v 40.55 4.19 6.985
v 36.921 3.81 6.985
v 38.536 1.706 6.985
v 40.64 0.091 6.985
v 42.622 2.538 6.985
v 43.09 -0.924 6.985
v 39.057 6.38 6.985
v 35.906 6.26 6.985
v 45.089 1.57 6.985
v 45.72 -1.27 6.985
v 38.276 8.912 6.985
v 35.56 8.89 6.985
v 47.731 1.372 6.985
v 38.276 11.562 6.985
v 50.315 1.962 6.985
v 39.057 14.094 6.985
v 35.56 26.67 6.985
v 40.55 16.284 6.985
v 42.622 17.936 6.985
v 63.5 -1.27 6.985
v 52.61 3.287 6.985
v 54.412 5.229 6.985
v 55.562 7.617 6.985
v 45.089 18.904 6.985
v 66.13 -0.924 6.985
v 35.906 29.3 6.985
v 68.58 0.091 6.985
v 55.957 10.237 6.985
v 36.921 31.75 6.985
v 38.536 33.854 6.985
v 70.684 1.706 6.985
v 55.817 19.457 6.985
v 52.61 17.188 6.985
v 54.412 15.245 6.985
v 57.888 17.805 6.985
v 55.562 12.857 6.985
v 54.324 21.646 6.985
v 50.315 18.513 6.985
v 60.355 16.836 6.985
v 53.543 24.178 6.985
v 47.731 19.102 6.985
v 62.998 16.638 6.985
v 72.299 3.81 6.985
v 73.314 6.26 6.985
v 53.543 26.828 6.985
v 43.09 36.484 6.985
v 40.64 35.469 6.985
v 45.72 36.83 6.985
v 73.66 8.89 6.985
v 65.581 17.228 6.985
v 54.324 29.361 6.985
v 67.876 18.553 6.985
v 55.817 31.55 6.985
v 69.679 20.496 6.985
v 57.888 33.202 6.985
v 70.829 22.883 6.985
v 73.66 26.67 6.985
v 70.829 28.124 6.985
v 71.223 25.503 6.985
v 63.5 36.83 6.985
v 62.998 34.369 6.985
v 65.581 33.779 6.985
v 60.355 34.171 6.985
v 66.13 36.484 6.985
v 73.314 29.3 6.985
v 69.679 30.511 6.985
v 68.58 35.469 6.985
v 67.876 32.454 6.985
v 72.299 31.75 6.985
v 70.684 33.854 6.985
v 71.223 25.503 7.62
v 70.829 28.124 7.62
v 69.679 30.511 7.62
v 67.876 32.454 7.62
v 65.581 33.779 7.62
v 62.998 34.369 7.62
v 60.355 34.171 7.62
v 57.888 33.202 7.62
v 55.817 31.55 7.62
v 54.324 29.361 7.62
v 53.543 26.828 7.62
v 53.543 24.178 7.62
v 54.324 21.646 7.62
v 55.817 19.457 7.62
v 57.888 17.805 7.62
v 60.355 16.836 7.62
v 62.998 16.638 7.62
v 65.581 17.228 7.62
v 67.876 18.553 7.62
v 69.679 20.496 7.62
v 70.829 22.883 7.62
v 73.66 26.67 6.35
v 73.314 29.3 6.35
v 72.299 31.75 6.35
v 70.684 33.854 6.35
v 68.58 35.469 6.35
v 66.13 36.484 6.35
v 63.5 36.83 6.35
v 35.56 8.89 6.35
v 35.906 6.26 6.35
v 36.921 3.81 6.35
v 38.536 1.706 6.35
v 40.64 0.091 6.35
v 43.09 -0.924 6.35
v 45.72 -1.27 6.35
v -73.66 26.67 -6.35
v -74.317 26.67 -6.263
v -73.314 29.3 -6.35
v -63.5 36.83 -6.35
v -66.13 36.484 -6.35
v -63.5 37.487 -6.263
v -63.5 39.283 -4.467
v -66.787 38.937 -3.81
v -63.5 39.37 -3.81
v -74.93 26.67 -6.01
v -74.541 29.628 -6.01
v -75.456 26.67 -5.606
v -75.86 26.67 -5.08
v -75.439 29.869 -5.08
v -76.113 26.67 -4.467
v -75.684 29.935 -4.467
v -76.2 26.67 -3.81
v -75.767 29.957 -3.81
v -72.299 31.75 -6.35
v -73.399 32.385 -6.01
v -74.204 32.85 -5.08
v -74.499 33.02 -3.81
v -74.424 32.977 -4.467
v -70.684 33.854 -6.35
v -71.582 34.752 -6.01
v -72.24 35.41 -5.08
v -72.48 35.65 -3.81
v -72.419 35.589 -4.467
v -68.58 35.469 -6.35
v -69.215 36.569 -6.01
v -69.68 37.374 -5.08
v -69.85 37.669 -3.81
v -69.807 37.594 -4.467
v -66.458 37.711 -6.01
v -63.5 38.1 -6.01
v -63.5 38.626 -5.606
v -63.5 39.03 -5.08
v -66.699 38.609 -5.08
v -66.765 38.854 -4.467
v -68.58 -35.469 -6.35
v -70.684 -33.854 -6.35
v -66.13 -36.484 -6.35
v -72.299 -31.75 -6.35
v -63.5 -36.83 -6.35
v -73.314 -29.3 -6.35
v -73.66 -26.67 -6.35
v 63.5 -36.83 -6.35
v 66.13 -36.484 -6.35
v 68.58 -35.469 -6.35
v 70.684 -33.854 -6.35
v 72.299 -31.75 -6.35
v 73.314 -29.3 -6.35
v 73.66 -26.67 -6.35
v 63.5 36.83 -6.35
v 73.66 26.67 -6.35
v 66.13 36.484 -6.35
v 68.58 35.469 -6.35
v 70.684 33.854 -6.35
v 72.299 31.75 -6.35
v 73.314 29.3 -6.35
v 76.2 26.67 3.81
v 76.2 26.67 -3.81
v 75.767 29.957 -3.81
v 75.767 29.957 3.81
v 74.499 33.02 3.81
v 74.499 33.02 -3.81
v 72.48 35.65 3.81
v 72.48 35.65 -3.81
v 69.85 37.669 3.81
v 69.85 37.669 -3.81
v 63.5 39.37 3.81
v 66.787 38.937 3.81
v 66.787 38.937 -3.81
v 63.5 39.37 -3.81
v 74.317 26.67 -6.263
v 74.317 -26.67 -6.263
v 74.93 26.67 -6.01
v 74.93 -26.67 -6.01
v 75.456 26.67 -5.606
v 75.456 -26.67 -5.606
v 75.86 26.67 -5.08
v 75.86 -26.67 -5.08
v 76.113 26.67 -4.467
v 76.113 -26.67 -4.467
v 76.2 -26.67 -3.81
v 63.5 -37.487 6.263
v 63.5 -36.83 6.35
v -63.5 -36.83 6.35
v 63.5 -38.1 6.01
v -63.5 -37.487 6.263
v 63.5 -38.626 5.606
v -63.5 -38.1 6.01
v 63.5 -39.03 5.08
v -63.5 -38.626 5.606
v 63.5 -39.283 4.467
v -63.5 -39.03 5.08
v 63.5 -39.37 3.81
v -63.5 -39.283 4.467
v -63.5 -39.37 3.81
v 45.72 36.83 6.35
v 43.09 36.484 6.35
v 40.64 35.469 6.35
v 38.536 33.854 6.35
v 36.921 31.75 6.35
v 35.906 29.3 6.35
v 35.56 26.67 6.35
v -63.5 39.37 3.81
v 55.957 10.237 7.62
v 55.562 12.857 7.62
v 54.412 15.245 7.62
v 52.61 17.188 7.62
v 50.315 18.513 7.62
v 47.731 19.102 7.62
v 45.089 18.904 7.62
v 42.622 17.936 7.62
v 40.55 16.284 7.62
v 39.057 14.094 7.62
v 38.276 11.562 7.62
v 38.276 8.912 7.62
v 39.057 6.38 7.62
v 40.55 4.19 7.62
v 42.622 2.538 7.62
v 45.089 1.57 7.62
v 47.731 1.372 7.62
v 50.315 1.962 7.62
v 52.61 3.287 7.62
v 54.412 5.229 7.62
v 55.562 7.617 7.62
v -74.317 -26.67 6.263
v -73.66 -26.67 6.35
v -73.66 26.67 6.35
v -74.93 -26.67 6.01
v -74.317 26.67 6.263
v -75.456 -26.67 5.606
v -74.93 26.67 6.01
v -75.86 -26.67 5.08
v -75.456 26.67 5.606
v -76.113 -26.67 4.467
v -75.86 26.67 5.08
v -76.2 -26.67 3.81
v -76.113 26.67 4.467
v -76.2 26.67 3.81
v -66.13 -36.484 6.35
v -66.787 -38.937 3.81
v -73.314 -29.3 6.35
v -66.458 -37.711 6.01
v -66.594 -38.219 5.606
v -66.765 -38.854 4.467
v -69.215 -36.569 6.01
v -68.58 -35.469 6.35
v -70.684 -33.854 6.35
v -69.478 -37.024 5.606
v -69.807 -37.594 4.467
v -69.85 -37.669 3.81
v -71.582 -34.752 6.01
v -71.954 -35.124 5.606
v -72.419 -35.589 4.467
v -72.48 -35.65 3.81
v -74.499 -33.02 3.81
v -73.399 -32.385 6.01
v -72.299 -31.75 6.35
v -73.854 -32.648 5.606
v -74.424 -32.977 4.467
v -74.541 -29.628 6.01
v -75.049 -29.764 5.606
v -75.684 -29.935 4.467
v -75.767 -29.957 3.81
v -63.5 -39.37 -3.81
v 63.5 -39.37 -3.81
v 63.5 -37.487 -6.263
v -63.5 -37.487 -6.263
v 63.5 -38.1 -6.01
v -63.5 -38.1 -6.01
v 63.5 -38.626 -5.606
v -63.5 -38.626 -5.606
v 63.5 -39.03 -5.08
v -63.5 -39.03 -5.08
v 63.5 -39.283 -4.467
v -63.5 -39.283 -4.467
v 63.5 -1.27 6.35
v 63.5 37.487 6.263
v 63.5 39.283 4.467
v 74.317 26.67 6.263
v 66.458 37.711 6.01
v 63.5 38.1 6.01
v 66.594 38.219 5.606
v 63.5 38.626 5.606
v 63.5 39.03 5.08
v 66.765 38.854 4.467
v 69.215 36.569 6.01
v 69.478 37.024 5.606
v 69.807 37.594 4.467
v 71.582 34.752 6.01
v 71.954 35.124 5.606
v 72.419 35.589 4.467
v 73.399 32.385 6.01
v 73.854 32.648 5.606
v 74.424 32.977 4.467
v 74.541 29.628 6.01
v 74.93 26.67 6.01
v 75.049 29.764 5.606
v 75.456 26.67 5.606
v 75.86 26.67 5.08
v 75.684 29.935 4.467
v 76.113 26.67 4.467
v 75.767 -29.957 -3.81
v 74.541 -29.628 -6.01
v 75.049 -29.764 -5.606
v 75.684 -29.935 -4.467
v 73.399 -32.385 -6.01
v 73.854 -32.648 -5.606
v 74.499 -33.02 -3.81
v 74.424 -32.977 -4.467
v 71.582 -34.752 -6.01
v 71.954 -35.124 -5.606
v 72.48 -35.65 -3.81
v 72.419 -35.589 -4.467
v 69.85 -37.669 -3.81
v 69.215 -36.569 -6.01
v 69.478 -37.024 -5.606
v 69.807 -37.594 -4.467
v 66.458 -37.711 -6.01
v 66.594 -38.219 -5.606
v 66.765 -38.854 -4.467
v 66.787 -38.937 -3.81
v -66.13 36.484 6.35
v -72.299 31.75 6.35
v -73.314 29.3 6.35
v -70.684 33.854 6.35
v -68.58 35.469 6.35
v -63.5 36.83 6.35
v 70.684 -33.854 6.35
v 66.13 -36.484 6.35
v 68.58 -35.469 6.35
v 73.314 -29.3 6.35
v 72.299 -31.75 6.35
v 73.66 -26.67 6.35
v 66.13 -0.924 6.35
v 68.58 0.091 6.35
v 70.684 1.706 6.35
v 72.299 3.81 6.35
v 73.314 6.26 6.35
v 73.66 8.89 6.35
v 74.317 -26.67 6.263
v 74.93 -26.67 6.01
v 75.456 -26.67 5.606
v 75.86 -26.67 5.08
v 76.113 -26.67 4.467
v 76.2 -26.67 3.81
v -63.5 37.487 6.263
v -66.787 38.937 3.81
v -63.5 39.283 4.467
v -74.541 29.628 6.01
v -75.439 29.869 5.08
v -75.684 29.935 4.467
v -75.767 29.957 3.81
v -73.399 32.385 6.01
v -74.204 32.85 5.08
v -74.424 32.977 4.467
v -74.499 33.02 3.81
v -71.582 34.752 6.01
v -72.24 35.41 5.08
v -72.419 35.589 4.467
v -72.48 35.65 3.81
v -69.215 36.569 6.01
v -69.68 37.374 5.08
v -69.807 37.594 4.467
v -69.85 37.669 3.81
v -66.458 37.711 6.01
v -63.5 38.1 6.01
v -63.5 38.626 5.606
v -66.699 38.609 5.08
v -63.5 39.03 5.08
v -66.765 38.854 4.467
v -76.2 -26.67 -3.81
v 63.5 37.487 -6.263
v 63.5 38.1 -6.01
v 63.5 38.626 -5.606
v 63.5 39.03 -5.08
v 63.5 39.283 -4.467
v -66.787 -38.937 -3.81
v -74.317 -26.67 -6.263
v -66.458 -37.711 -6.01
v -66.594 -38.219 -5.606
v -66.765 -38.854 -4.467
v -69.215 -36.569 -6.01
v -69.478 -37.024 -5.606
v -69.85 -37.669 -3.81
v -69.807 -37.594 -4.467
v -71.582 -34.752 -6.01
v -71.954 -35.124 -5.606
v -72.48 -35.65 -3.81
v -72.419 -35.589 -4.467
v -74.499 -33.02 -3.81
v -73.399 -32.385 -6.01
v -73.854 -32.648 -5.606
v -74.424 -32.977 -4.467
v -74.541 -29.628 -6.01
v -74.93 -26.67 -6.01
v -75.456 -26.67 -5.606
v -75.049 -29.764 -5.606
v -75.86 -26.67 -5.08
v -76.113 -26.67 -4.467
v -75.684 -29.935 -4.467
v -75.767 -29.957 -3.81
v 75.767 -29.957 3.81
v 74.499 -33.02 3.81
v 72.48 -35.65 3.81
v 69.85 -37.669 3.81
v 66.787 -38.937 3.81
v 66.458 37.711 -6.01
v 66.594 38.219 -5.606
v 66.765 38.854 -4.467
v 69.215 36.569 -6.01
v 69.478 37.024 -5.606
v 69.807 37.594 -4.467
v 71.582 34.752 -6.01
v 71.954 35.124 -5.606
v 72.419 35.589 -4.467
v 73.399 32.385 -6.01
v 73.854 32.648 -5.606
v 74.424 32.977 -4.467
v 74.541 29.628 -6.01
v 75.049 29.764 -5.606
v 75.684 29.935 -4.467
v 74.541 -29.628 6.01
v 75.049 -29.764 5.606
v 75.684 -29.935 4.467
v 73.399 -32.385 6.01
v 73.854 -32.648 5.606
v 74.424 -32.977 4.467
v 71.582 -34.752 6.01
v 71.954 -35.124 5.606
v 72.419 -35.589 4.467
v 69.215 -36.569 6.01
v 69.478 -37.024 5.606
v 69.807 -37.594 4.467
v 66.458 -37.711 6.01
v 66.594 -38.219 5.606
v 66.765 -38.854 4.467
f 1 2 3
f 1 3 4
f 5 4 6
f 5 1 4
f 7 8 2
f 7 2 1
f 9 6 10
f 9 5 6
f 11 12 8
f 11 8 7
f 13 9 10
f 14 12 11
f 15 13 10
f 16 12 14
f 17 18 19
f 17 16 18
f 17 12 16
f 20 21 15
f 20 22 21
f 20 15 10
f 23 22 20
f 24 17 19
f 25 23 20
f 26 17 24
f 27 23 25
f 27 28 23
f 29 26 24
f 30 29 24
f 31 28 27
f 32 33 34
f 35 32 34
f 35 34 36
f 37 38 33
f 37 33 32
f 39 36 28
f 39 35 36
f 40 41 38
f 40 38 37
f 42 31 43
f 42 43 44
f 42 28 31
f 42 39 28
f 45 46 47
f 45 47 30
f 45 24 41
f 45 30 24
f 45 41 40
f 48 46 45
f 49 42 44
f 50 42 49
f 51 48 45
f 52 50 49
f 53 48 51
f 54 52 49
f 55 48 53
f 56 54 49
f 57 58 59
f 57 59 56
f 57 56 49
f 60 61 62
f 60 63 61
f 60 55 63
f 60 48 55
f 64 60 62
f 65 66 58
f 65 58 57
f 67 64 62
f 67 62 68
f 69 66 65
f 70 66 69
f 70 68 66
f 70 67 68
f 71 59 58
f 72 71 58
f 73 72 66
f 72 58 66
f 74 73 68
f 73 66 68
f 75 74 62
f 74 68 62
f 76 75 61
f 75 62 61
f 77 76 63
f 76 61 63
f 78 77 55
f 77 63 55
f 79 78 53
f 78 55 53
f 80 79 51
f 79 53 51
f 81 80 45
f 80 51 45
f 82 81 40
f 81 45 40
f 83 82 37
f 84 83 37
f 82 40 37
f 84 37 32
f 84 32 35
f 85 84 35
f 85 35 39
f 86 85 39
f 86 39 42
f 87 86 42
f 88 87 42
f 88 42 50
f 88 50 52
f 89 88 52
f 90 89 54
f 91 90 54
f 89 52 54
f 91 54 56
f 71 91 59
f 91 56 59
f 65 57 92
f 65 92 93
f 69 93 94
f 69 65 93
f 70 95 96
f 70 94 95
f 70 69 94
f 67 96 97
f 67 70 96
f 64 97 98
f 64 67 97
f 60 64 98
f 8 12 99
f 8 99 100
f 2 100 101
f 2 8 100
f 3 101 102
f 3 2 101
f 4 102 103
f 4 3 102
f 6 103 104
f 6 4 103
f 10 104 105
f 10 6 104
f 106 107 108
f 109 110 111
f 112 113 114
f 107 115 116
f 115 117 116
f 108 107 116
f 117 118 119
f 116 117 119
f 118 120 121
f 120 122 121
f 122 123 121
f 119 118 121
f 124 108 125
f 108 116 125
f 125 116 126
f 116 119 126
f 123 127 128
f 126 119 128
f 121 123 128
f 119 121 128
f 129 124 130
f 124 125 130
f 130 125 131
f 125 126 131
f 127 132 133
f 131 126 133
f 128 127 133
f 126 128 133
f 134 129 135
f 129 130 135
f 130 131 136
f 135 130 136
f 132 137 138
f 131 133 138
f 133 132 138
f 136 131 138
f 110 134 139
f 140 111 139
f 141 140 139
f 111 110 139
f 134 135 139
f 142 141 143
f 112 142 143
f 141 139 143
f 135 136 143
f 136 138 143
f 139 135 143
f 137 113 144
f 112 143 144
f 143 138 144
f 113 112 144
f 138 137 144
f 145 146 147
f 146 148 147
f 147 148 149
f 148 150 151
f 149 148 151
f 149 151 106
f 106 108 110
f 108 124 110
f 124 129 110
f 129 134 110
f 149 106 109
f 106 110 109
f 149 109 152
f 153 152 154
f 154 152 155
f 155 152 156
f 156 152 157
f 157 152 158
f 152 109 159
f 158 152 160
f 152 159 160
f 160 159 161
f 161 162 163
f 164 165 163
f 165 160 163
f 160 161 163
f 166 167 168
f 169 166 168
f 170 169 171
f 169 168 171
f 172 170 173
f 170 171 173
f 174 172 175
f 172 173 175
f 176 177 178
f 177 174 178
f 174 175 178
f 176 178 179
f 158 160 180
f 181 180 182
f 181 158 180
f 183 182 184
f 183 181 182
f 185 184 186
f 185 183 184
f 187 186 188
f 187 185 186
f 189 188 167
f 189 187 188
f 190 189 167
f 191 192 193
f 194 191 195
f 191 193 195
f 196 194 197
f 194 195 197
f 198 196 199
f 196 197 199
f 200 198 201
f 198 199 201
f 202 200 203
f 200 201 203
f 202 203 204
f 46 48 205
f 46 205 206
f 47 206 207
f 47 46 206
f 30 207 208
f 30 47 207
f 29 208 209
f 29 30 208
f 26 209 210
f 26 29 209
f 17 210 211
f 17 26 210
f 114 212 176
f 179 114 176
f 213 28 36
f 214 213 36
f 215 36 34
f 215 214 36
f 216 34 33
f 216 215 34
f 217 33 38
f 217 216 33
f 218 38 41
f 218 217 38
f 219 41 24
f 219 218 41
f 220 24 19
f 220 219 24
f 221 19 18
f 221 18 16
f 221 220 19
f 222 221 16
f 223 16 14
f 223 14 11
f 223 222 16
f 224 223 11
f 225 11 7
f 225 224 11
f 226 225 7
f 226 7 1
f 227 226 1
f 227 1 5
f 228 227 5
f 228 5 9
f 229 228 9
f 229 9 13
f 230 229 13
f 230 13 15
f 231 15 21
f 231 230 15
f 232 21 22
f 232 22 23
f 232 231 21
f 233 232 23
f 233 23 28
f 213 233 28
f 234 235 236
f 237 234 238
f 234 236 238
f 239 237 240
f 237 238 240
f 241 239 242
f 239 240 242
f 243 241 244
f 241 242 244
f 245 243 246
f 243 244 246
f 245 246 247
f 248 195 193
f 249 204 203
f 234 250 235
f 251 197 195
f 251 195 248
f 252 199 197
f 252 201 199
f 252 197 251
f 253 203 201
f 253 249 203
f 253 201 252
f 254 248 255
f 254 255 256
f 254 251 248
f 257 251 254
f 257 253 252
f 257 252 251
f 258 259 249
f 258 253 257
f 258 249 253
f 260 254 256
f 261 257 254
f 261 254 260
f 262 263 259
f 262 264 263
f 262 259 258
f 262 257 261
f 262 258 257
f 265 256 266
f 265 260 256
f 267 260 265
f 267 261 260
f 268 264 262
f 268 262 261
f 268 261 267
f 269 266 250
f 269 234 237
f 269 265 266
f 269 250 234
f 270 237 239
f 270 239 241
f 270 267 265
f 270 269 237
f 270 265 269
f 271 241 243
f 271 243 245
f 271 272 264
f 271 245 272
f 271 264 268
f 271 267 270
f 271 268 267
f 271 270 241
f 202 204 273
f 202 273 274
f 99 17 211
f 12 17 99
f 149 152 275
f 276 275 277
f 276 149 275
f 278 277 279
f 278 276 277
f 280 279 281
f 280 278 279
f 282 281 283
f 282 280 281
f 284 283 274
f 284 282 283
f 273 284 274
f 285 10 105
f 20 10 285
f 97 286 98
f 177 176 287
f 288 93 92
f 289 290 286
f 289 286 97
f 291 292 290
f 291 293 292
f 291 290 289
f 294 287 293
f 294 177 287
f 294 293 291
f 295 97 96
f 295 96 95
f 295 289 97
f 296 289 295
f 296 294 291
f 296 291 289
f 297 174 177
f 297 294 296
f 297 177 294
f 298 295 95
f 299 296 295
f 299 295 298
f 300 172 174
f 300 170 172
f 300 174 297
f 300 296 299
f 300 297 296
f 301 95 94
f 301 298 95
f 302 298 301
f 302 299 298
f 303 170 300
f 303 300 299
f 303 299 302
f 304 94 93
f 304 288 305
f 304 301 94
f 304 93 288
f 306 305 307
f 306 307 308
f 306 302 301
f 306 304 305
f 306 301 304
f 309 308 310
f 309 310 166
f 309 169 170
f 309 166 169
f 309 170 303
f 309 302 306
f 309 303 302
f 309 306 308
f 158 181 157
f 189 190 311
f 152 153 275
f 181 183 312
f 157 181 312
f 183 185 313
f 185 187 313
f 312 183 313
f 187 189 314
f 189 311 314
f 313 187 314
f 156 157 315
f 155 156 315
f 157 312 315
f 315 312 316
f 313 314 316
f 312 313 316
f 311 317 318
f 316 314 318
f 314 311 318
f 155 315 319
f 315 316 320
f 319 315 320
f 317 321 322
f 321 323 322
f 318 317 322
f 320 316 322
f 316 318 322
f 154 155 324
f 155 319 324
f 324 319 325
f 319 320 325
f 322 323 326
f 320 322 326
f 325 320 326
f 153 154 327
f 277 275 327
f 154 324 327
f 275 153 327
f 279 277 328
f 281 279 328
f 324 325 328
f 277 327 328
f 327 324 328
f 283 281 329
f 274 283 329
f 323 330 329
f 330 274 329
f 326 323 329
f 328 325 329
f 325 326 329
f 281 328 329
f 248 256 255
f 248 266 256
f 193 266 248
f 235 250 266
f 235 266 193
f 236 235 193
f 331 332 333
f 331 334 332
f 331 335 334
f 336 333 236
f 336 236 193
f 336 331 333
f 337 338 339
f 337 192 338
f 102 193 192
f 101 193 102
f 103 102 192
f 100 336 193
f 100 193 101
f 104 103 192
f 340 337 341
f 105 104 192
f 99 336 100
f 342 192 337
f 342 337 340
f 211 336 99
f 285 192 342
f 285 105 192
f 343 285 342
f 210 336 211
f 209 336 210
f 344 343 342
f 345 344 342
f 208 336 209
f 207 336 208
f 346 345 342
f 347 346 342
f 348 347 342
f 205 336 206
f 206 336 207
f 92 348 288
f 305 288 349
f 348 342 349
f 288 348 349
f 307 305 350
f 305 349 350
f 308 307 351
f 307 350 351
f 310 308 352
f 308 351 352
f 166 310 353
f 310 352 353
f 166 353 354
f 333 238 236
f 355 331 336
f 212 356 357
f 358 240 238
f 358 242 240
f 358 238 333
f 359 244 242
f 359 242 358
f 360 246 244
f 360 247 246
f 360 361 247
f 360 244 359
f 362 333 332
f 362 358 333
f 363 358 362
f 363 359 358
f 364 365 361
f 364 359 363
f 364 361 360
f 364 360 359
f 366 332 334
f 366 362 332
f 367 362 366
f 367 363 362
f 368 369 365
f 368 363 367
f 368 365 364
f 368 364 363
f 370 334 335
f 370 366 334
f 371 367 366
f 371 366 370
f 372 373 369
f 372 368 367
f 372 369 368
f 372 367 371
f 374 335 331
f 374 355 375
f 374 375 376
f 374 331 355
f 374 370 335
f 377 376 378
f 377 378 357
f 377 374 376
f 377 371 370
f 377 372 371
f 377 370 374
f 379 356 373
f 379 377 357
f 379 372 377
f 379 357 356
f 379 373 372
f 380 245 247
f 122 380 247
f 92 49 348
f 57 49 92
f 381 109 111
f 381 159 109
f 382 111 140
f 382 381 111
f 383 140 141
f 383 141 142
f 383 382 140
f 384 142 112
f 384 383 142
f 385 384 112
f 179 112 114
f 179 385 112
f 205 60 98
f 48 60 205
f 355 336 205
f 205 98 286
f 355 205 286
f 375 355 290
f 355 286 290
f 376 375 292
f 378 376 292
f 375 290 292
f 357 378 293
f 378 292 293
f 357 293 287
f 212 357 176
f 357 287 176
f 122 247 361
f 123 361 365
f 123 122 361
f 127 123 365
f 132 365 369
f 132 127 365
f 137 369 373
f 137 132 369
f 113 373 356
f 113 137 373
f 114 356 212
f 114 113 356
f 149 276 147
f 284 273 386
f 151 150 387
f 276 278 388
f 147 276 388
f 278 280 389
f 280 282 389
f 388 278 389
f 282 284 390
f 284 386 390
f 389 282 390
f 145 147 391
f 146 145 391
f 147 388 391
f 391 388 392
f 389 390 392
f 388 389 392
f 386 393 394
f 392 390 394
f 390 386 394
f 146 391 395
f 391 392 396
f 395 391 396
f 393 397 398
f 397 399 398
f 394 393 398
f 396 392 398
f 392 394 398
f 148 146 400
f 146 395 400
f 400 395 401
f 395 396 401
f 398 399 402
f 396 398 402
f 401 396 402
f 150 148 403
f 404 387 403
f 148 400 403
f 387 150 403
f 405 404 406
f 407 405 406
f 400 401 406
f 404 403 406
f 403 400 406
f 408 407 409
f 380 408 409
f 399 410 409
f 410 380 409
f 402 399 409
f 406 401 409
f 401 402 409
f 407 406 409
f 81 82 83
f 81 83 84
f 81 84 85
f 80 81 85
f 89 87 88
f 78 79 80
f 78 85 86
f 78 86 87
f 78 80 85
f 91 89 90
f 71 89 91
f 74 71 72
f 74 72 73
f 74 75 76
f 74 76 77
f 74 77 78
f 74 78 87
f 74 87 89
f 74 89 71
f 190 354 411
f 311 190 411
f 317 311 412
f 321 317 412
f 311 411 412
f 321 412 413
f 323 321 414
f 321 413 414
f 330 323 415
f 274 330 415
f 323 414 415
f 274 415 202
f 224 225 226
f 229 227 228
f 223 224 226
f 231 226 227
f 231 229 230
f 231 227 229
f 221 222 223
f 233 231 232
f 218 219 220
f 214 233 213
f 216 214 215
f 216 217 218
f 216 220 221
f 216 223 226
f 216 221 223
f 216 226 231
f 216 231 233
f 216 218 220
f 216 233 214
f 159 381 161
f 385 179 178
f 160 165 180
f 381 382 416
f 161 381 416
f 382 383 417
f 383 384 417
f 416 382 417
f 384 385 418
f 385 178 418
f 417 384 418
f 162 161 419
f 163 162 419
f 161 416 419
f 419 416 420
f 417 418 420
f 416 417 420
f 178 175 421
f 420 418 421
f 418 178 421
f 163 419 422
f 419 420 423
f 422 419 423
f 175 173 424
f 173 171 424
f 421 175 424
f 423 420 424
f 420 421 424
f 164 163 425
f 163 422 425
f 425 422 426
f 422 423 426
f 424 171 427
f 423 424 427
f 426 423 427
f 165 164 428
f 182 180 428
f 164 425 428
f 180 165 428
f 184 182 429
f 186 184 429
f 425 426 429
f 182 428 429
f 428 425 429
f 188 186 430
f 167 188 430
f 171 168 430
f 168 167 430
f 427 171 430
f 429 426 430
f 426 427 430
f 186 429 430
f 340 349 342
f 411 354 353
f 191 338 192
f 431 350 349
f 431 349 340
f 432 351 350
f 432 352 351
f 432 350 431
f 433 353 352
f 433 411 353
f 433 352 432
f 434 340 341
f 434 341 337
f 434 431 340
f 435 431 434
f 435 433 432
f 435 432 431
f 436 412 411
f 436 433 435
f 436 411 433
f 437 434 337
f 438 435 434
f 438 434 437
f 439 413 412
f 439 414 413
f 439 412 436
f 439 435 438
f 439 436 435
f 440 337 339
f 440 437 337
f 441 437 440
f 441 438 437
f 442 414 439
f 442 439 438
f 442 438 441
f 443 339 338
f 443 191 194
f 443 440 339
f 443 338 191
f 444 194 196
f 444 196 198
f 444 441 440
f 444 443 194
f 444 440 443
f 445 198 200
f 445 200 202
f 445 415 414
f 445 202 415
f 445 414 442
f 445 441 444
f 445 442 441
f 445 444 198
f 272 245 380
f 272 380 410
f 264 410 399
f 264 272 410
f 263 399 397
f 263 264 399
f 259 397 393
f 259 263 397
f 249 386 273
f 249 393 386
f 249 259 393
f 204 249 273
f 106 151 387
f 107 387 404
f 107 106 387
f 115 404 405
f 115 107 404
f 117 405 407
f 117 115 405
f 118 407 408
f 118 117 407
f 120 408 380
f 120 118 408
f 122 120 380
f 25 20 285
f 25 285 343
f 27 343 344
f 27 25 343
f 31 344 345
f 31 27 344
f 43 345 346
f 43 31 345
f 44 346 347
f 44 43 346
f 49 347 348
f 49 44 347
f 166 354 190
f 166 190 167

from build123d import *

# Parameters (mm, degrees)
SKETCH1_W           = 152.4
SKETCH1_H           = 78.74
BOSS_EXTRUDE1_DEPTH = 6.35
FILLET1_R           = 12.7
FILLET2_R           = 2.54
BOSS_EXTRUDE2_DEPTH = 0.635
SKETCH3_R           = 8.89
BOSS_EXTRUDE3_DEPTH = 0.635


with BuildPart() as part:
    # Sketch1 → Boss-Extrude1 (new body, symmetric)
    with BuildSketch(Plane.XY):
        Rectangle(SKETCH1_W, SKETCH1_H)
    extrude(amount=BOSS_EXTRUDE1_DEPTH, both=True)

    # Fillet1
    fillet1_edges = [part.edges().sort_by_distance(p)[0] for p in [
        (76.2, -39.37, 0),
        (-76.2, -39.37, 0),
        (-76.2, 39.37, 0),
        (76.2, 39.37, 0),
    ]]
    fillet(fillet1_edges, radius=FILLET1_R)

    # Fillet2
    fillet2_edges = [part.edges().sort_by_distance(p)[0] for p in [
        (0, 39.37, -6.35),
        (0, 39.37, 6.35),
        (76.2, 0, -6.35),
        (0, -39.37, -6.35),
        (-76.2, 0, -6.35),
        (-72.480256121, 35.650256121, -6.35),
        (-72.480256121, -35.650256121, -6.35),
        (72.480256121, -35.650256121, -6.35),
        (72.480256121, 35.650256121, -6.35),
        (76.2, 0, 6.35),
        (-76.2, 0, 6.35),
        (0, -39.37, 6.35),
        (-72.480256121, 35.650256121, 6.35),
        (-72.480256121, -35.650256121, 6.35),
        (72.480256121, -35.650256121, 6.35),
        (72.480256121, 35.650256121, 6.35),
    ]]
    fillet(fillet2_edges, radius=FILLET2_R)

    # Sketch2 → Boss-Extrude2 (add, symmetric)
    with BuildSketch(Plane.XY.offset(6.35)):
        with BuildLine():
            ThreePointArc((73.66, 26.67), (70.684204897, 33.854204897), (63.5, 36.83))
            Line((63.5, 36.83), (45.72, 36.83))
            ThreePointArc((45.72, 36.83), (38.535795103, 33.854204897), (35.56, 26.67))
            Line((35.56, 26.67), (35.56, 8.89))
            ThreePointArc((35.56, 8.89), (38.535795103, 1.705795103), (45.72, -1.27))
            Line((45.72, -1.27), (63.5, -1.27))
            ThreePointArc((63.5, -1.27), (70.684204897, 1.705795103), (73.66, 8.89))
            Line((73.66, 8.89), (73.66, 26.67))
        make_face()
    extrude(amount=BOSS_EXTRUDE2_DEPTH, both=True)

    # Sketch3 → Boss-Extrude3 (add, symmetric)
    with BuildSketch(Plane.XY.offset(6.985)):
        with Locations((62.333473824, 25.503473824)):
            Circle(SKETCH3_R)
        with Locations((47.067038418, 10.237038418)):
            Circle(SKETCH3_R)
    extrude(amount=BOSS_EXTRUDE3_DEPTH, both=True)


solid = part.part
